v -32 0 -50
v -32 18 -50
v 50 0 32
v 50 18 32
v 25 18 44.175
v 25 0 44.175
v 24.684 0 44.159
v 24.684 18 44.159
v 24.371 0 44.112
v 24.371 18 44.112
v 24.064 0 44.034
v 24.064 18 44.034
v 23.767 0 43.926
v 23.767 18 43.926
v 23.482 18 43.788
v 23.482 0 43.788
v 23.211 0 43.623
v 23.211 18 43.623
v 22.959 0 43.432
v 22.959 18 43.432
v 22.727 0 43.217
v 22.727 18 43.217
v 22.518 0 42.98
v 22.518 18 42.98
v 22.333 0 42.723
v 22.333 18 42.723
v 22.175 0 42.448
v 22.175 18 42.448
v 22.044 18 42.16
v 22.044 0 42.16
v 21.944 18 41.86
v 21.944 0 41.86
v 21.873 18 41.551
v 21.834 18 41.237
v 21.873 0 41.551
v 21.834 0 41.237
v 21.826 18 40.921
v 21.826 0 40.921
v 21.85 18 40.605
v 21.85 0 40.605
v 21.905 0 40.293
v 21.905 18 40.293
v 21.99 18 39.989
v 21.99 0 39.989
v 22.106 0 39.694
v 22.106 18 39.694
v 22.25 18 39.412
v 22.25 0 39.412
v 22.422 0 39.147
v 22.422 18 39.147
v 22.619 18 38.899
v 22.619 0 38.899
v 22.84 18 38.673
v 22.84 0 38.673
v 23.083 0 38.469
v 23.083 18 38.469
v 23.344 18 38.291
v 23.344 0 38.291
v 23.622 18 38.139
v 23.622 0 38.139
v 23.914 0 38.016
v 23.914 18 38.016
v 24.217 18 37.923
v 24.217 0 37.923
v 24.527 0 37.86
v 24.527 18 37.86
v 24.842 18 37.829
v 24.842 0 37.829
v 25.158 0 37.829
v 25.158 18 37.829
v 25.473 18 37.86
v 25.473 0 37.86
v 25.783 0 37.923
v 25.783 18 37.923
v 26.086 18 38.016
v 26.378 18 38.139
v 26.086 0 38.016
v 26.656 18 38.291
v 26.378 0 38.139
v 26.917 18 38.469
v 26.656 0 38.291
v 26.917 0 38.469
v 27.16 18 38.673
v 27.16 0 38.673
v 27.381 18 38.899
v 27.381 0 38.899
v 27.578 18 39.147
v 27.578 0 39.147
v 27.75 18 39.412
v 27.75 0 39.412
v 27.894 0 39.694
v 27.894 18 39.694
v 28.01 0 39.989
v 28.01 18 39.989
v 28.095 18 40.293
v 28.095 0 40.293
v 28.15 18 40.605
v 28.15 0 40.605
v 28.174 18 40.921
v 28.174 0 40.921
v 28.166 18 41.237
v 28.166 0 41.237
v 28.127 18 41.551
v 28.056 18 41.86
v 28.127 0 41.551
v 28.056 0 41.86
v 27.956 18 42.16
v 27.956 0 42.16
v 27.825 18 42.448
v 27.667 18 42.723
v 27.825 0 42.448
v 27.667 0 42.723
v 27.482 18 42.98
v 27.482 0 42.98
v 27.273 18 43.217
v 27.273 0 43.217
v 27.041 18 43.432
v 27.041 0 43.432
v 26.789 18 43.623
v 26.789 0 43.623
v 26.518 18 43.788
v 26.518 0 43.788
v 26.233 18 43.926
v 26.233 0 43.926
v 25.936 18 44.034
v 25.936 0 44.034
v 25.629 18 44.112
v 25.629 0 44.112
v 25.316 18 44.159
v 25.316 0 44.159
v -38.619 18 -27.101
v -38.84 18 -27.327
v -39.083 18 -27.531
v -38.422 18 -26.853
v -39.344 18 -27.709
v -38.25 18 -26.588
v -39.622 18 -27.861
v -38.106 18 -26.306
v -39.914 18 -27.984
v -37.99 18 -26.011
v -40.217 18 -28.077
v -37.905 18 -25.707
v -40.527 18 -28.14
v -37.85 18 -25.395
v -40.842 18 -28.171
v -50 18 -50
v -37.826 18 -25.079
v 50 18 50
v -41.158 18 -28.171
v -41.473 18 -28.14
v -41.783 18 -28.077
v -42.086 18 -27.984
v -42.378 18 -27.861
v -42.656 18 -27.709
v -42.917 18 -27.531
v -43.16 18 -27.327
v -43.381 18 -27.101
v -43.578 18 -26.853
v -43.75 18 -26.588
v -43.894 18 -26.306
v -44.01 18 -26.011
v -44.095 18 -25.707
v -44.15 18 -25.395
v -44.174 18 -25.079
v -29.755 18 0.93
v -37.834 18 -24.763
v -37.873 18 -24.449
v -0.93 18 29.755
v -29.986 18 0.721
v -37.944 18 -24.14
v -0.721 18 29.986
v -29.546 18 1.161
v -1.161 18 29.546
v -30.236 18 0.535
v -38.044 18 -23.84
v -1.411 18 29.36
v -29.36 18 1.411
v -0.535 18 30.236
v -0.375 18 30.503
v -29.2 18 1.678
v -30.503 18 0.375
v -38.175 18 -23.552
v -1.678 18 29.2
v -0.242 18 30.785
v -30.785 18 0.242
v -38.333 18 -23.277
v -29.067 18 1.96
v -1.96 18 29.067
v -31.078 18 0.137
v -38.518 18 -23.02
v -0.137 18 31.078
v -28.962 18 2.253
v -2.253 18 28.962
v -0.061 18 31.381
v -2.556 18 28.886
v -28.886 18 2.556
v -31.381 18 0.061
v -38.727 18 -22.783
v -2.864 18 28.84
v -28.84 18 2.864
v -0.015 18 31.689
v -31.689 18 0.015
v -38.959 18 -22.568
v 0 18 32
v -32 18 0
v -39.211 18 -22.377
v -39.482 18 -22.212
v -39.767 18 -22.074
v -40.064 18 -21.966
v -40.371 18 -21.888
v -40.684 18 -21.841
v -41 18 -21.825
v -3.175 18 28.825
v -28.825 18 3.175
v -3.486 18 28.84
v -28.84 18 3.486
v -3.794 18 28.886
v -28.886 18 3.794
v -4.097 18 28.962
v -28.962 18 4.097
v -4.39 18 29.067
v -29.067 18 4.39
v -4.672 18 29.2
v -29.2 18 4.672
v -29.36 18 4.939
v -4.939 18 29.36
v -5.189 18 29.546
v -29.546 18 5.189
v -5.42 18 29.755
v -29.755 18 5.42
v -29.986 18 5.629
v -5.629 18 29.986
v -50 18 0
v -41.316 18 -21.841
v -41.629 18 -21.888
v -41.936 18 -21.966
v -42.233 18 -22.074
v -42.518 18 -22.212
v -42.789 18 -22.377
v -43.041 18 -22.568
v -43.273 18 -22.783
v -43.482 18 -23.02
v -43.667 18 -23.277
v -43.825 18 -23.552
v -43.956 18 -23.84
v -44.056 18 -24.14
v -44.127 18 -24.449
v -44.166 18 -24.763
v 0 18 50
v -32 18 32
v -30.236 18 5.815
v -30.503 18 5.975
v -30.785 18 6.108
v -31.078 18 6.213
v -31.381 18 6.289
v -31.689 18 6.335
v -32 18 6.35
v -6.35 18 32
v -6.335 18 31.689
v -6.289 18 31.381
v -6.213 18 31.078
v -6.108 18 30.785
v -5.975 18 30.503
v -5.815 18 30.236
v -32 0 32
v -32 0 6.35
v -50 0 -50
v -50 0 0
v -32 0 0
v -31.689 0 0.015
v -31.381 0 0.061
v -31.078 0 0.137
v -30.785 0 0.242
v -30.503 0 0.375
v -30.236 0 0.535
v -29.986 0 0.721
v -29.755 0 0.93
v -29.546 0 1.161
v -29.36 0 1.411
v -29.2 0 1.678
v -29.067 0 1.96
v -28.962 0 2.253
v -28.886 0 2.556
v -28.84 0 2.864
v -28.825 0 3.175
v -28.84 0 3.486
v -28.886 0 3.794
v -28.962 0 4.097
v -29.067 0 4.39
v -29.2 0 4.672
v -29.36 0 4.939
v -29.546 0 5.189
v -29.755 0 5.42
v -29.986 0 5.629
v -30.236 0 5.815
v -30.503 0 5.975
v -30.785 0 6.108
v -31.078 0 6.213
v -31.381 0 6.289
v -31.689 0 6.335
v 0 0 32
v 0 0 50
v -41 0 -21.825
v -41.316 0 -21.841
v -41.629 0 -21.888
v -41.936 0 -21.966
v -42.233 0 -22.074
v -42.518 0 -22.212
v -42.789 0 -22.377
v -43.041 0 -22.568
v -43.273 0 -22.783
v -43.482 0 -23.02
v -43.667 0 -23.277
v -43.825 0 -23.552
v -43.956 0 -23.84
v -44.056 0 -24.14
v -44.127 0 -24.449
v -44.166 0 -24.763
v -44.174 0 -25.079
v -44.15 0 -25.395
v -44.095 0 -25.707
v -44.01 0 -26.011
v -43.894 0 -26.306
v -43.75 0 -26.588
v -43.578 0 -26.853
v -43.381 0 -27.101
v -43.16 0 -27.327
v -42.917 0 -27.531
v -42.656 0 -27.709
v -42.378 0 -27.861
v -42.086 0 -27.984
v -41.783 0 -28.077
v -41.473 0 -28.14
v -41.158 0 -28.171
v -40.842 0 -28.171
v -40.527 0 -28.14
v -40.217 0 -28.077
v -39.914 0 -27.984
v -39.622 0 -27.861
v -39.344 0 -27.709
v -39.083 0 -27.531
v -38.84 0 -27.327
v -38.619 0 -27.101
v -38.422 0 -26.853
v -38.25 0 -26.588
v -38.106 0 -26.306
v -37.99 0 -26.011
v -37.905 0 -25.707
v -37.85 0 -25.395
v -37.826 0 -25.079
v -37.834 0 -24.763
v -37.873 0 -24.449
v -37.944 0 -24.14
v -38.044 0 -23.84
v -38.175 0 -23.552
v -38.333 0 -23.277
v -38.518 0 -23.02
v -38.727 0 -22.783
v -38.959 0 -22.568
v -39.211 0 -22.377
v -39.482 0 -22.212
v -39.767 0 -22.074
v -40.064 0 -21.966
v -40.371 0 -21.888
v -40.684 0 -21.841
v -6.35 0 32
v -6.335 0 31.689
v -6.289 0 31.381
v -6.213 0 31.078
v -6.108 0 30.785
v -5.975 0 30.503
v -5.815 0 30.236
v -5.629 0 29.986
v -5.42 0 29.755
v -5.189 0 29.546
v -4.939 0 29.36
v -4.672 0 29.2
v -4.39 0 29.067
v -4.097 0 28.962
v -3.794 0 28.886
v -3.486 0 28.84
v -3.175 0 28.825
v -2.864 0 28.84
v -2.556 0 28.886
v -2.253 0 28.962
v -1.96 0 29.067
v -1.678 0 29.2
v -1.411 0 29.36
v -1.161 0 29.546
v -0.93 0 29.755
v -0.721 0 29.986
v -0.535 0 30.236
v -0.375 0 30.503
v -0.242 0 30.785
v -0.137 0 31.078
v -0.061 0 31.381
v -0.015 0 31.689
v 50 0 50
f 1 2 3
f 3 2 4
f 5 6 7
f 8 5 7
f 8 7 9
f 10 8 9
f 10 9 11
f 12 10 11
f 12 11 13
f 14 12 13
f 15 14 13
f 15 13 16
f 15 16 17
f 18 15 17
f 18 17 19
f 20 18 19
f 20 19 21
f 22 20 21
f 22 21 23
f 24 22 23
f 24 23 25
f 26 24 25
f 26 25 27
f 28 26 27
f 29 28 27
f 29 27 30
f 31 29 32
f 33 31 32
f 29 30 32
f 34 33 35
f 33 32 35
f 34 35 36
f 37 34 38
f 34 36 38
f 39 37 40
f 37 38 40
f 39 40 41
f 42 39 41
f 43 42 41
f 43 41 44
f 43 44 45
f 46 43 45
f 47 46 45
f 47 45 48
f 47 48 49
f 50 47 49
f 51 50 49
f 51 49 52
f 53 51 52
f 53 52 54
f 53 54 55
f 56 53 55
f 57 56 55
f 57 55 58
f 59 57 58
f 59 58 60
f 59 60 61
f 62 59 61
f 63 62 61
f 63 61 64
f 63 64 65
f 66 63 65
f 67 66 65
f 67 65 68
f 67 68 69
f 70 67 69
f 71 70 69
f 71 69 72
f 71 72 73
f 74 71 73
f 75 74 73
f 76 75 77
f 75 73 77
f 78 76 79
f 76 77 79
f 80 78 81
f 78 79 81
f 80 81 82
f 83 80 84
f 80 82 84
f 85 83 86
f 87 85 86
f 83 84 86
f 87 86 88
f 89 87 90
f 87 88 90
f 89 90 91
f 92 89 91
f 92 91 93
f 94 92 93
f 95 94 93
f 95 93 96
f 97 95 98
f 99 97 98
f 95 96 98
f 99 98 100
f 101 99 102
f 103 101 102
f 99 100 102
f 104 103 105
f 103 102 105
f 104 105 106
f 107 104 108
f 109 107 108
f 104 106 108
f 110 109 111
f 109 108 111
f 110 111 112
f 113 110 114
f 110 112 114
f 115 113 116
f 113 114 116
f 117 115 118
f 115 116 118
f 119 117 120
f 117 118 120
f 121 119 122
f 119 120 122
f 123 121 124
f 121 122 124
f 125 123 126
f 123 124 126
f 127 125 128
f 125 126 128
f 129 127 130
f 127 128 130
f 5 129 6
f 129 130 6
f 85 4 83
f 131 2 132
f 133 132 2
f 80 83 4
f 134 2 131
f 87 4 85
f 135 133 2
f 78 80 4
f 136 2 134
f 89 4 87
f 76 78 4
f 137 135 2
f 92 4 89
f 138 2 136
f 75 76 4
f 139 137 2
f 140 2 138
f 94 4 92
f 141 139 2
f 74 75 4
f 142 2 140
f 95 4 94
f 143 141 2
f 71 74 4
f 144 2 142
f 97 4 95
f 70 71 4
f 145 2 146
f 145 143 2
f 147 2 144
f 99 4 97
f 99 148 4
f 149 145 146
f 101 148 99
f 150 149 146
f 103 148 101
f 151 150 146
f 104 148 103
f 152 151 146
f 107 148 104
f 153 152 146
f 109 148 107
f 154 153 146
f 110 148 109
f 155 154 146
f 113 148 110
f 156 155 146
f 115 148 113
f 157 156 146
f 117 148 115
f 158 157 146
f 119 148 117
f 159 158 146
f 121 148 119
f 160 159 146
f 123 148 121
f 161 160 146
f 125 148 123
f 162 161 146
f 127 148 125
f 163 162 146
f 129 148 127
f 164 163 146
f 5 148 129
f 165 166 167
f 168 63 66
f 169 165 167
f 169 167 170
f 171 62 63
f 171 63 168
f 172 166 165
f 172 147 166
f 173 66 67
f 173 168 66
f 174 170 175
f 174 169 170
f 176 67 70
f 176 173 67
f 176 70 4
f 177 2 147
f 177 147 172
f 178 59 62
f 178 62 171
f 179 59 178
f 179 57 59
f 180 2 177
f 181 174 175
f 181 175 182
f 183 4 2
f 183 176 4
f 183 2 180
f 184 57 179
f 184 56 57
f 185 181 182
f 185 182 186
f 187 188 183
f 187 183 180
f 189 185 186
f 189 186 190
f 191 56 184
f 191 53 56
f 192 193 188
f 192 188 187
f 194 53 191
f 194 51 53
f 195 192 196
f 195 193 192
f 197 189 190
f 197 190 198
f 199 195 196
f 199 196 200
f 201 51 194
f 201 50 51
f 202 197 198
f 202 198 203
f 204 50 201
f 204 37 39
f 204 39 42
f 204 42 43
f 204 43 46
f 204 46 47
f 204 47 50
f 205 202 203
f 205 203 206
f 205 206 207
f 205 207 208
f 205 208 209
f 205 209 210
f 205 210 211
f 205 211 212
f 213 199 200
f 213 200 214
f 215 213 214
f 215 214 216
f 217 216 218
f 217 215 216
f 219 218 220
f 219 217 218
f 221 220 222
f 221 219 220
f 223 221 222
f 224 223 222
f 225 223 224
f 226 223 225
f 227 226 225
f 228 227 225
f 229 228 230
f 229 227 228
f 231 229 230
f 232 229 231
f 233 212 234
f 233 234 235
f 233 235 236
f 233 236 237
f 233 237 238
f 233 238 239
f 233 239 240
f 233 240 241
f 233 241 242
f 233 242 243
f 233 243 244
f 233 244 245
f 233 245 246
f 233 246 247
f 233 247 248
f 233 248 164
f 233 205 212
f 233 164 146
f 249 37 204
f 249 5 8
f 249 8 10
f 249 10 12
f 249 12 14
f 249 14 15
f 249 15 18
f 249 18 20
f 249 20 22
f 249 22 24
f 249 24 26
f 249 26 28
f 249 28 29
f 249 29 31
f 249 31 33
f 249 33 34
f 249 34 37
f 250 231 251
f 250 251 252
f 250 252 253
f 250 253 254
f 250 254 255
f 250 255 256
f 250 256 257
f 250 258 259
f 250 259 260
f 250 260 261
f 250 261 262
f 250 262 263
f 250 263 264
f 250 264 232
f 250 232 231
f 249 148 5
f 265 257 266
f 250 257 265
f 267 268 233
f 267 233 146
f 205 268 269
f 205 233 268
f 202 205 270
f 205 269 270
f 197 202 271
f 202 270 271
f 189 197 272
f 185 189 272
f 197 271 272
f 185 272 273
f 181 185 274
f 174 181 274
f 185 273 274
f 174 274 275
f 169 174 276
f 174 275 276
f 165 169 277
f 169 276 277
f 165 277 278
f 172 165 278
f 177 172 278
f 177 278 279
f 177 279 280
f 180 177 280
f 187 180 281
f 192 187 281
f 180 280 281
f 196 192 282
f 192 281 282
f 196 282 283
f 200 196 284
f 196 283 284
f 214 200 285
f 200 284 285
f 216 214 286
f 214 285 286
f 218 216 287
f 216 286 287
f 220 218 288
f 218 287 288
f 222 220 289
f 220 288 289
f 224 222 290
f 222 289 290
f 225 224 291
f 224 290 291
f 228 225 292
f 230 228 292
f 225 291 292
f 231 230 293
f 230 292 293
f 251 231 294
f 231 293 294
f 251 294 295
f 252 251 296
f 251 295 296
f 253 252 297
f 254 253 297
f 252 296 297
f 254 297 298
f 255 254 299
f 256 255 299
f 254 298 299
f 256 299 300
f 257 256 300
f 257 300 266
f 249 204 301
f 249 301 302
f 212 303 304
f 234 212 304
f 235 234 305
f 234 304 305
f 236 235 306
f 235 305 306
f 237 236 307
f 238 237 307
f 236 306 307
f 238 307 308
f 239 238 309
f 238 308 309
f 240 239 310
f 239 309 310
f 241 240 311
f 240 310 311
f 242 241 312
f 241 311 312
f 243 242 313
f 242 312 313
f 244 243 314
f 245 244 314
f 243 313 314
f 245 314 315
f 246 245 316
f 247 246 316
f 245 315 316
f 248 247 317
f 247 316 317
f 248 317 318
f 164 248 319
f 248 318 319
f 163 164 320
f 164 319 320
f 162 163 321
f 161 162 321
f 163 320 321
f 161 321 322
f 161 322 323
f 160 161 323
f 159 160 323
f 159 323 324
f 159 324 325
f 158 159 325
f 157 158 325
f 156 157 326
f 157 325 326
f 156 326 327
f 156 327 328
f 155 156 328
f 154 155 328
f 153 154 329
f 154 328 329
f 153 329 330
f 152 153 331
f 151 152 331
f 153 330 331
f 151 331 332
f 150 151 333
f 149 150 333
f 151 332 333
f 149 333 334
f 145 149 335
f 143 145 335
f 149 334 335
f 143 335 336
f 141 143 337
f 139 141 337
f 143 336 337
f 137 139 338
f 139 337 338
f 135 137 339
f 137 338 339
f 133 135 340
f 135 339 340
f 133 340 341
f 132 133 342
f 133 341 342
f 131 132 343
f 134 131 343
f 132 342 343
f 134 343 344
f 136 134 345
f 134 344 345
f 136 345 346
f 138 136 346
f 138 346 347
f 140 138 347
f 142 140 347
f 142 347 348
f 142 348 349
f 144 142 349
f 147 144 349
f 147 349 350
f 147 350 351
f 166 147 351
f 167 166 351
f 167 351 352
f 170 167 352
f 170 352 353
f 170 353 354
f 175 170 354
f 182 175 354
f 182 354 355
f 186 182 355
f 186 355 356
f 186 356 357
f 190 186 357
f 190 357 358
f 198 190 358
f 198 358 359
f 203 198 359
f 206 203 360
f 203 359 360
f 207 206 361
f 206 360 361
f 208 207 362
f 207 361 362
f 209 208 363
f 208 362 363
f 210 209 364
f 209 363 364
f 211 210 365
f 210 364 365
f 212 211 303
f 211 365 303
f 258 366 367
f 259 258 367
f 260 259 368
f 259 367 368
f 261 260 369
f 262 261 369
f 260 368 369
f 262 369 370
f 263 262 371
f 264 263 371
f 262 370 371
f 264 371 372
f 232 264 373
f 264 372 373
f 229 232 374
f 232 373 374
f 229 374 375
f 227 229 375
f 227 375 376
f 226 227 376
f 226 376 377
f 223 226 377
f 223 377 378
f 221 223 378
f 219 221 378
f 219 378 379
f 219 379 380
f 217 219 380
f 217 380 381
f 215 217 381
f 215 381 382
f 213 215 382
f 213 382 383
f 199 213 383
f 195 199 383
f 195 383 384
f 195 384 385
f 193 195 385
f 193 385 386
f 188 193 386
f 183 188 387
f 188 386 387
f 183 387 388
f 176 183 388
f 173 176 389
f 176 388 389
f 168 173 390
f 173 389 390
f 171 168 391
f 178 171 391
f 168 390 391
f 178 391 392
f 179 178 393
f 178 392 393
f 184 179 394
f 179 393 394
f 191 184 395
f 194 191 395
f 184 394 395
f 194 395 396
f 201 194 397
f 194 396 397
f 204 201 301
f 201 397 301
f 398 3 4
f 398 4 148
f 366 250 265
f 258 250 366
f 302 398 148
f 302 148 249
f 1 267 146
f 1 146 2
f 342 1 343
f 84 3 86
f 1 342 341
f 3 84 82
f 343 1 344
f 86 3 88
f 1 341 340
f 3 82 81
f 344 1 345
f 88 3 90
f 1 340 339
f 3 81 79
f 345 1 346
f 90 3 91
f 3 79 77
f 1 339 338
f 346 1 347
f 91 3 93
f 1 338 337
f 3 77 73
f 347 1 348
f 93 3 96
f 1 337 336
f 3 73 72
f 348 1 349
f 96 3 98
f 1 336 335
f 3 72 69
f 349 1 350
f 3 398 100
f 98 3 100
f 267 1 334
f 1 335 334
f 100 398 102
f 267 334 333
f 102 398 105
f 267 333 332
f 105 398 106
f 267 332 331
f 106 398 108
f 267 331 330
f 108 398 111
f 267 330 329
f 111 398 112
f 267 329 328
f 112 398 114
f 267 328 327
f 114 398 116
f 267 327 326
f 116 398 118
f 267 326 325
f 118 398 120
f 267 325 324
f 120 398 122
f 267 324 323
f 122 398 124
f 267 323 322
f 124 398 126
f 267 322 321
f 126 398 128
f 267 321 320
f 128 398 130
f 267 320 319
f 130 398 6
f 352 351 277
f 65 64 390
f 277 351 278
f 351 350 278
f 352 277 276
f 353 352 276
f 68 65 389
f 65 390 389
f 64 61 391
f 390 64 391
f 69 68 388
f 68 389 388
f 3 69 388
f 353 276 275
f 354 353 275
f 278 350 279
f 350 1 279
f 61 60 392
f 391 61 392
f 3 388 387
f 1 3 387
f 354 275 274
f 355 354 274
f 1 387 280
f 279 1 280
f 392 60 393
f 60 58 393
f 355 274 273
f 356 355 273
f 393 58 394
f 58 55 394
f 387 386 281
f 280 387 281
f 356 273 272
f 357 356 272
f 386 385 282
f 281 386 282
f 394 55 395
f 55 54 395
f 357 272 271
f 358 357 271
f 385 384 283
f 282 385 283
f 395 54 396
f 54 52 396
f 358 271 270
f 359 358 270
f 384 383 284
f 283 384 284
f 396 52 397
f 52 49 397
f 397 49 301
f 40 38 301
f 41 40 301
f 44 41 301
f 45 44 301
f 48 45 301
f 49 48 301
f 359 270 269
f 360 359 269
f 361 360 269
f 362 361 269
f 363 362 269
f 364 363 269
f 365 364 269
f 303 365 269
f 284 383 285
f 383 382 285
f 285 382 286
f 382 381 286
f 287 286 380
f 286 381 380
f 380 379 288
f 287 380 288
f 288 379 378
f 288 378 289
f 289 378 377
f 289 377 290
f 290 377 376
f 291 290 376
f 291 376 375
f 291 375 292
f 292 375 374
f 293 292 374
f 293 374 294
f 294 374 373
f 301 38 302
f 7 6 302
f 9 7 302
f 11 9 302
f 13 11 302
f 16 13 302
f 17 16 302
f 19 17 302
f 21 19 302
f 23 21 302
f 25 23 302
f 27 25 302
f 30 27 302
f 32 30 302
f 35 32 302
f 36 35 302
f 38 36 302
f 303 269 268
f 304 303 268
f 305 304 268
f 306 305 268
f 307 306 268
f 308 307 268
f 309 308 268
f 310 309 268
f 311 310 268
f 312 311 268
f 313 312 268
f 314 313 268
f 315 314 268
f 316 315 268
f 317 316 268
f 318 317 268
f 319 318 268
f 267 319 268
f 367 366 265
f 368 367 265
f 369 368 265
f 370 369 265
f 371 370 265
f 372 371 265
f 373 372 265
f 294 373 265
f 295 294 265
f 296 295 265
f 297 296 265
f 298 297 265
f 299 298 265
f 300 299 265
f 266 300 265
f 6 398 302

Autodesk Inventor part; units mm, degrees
ref_plane "YZ Plane" through (0, 0, 0) normal (1, 0, 0) x (0, 1, 0)
ref_plane "XZ Plane" through (0, 0, 0) normal (0, 1, 0) x (-1, 0, 0)
ref_plane "XY Plane" through (0, 0, 0) normal (0, 0, 1) x (1, 0, 0)
sketch "Sketch1" plane through (0, 0, 0) normal (0, 1, 0) x (-1, 0, 0)
  line L0 (50, -50) -> (-50, -50)
  line L1 (-50, -50) -> (-50, 50)
  line L2 (-50, 50) -> (50, 50)
  line L3 (50, 50) -> (50, -50)
  point P0 (0, 0)
  point P1 (-50, 0)
  point P2 (0, -50)
  dimension "d0" = 100
  dimension "d1" = 100
extrude "Extrusion1" add sketch "Sketch1" along normal blind 18
sketch "Sketch2" plane through (0, 18, 0) normal (0, 1, 0) x (1, 0, 0)
  line L0 (-50, 50) -> (-32, 50) construction
  line L1 (50, 50) -> (-50, 50) construction
  line L2 (50, 50) -> (-50, 50) construction
  line L3 (-50, 50) -> (-50, -50) construction
  line L4 (-50, -50) -> (50, -50) construction
  line L5 (50, -50) -> (50, 50) construction
  line L6 (50, -50) -> (50, -32) construction
  line L7 (-32, 50) -> (50, -32)
  line L8 (50, -32) -> (50, 50)
  line L9 (50, 50) -> (-32, 50)
  point P0 (0, 0)
  point P1 (-41, 50)
  point P2 (0, 50)
  point P3 (-50, 0)
  point P4 (0, -50)
  point P5 (50, -41)
  point P6 (50, 0)
  dimension "d4" = 18
  dimension "d5" = 18
extrude "Extrusion2" cut sketch "Sketch2" against normal blind 18
sketch "Sketch3" plane through (0, 18, 0) normal (0, 1, 0) x (1, 0, 0)
  line L0 (-50, 0) -> (-32, 0)
  line L1 (-32, 0) -> (-32, -50)
  line L2 (-32, -50) -> (-50, -50)
  line L3 (-50, -50) -> (-50, 0)
  line L4 (50, -32) -> (-32, 50) projected
  line L5 (-32, 50) -> (-50, 50) projected
  line L6 (-50, 50) -> (-50, -50) projected
  line L7 (-50, -50) -> (50, -50) projected
  line L8 (50, -50) -> (50, -32) projected
  line L9 (-50, 50) -> (-50, -50) projected
  line L10 (-50, -32) -> (0, -32)
  line L11 (0, -32) -> (0, -50)
  line L12 (0, -50) -> (-50, -50)
  line L13 (-50, -50) -> (-50, -32)
  line L14 (-50, -50) -> (50, -50) projected
  point P0 (0, 0)
  point P1 (-41, -50)
  point P2 (-50, -25)
  point P3 (-50, 0)
  point P4 (-41, 0)
  point P5 (-50, 0)
  point P6 (-25, -50)
  point P7 (0, -50)
  point P8 (-50, -41)
  point P9 (0, -41)
  point P10 (0, -50)
  dimension "d8" = 18
  dimension "d9" = 18
extrude "Extrusion3" cut sketch "Sketch3" against normal blind 18 contours L0 L1 L10 L3 | L10 L1 L2 L3 | L10 L11 L7 L1
sketch "Sketch4" plane through (0, 18, 0) normal (0, 1, 0) x (1, 0, 0)
  line L0 (0, -32) -> (0, -50) projected
  line L1 (0, -50) -> (50, -50) projected
  line L2 (50, -50) -> (50, -32) projected
  line L3 (50, -32) -> (-32, 50) projected
  line L4 (-32, 50) -> (-50, 50) projected
  line L5 (-50, 50) -> (-50, 0) projected
  line L6 (-50, 0) -> (-32, 0) projected
  line L7 (-32, 0) -> (-32, -32) projected
  line L8 (-32, -32) -> (0, -32) projected
  point P0 (0, 0)
  point P1 (-32, -3.175)
  point P2 (-3.175, -32)
  point P3 (-16, -32)
  dimension "d12" = 3.175
  dimension "d13" = 3.175
hole "Hole1" at (-32, 18, 3.175) at (-3.175, 18, 32) direction (0, -1, 0) diameter 6.35 end through all
sketch "Sketch5" plane through (0, 18, 0) normal (0, 1, 0) x (1, 0, 0)
  arc A0 (-32, -6.35) -> (-32, 0) centre (-32, -3.175) ccw projected
  line L0 (-32, -6.35) -> (-32, -32) projected
  line L1 (-32, -32) -> (-6.35, -32) projected
  arc A1 (0, -32) -> (-6.35, -32) centre (-3.175, -32) ccw projected
  line L2 (0, -32) -> (0, -50) projected
  line L3 (0, -50) -> (50, -50) projected
  line L4 (50, -50) -> (50, -32) projected
  line L5 (50, -32) -> (-32, 50) projected
  line L6 (-32, 50) -> (-50, 50) projected
  line L7 (-50, 50) -> (-50, 0) projected
  line L8 (-50, 0) -> (-32, 0) projected
  point P0 (0, 0)
  point P1 (-41, 25)
  point P2 (25, -41)
  point P3 (-50, 25)
  point P4 (-41, 50)
  point P5 (0, -41)
  point P6 (25, -50)
hole "Hole2" at (-41, 18, -25) at (25, 18, 41) direction (0, -1, 0) diameter 6.35 end through all
equation "\"d0\" = legBaseWidth"
equation "\"d1\" = legBaseWidth"
equation "\"d2\" = plyThickness"
equation "\"d4\" = plyThickness"
equation "\"d5\" = d4"
equation "\"d6\" = plyThickness"
equation "\"d8\" = plyThickness"
equation "\"d9\" = d8"
equation "\"d10\" = plyThickness"
equation "\"d12\" = 0.5 * millDiameter"
equation "\"d13\" = 0.5 * millDiameter"
equation "\"d14\" = millDiameter"
equation "\"d21\" = millDiameter"
equation "\"plyThickness\" = 18"
equation "\"legHeight\" = 702"
equation "\"legBaseWidth\" = 100"
equation "\"millDiameter\" = 6.35"
equation "\"legTopTabHeight\" = 18"
equation "\"legTopSlotDepth\" = 49"
properties part number "foot"
